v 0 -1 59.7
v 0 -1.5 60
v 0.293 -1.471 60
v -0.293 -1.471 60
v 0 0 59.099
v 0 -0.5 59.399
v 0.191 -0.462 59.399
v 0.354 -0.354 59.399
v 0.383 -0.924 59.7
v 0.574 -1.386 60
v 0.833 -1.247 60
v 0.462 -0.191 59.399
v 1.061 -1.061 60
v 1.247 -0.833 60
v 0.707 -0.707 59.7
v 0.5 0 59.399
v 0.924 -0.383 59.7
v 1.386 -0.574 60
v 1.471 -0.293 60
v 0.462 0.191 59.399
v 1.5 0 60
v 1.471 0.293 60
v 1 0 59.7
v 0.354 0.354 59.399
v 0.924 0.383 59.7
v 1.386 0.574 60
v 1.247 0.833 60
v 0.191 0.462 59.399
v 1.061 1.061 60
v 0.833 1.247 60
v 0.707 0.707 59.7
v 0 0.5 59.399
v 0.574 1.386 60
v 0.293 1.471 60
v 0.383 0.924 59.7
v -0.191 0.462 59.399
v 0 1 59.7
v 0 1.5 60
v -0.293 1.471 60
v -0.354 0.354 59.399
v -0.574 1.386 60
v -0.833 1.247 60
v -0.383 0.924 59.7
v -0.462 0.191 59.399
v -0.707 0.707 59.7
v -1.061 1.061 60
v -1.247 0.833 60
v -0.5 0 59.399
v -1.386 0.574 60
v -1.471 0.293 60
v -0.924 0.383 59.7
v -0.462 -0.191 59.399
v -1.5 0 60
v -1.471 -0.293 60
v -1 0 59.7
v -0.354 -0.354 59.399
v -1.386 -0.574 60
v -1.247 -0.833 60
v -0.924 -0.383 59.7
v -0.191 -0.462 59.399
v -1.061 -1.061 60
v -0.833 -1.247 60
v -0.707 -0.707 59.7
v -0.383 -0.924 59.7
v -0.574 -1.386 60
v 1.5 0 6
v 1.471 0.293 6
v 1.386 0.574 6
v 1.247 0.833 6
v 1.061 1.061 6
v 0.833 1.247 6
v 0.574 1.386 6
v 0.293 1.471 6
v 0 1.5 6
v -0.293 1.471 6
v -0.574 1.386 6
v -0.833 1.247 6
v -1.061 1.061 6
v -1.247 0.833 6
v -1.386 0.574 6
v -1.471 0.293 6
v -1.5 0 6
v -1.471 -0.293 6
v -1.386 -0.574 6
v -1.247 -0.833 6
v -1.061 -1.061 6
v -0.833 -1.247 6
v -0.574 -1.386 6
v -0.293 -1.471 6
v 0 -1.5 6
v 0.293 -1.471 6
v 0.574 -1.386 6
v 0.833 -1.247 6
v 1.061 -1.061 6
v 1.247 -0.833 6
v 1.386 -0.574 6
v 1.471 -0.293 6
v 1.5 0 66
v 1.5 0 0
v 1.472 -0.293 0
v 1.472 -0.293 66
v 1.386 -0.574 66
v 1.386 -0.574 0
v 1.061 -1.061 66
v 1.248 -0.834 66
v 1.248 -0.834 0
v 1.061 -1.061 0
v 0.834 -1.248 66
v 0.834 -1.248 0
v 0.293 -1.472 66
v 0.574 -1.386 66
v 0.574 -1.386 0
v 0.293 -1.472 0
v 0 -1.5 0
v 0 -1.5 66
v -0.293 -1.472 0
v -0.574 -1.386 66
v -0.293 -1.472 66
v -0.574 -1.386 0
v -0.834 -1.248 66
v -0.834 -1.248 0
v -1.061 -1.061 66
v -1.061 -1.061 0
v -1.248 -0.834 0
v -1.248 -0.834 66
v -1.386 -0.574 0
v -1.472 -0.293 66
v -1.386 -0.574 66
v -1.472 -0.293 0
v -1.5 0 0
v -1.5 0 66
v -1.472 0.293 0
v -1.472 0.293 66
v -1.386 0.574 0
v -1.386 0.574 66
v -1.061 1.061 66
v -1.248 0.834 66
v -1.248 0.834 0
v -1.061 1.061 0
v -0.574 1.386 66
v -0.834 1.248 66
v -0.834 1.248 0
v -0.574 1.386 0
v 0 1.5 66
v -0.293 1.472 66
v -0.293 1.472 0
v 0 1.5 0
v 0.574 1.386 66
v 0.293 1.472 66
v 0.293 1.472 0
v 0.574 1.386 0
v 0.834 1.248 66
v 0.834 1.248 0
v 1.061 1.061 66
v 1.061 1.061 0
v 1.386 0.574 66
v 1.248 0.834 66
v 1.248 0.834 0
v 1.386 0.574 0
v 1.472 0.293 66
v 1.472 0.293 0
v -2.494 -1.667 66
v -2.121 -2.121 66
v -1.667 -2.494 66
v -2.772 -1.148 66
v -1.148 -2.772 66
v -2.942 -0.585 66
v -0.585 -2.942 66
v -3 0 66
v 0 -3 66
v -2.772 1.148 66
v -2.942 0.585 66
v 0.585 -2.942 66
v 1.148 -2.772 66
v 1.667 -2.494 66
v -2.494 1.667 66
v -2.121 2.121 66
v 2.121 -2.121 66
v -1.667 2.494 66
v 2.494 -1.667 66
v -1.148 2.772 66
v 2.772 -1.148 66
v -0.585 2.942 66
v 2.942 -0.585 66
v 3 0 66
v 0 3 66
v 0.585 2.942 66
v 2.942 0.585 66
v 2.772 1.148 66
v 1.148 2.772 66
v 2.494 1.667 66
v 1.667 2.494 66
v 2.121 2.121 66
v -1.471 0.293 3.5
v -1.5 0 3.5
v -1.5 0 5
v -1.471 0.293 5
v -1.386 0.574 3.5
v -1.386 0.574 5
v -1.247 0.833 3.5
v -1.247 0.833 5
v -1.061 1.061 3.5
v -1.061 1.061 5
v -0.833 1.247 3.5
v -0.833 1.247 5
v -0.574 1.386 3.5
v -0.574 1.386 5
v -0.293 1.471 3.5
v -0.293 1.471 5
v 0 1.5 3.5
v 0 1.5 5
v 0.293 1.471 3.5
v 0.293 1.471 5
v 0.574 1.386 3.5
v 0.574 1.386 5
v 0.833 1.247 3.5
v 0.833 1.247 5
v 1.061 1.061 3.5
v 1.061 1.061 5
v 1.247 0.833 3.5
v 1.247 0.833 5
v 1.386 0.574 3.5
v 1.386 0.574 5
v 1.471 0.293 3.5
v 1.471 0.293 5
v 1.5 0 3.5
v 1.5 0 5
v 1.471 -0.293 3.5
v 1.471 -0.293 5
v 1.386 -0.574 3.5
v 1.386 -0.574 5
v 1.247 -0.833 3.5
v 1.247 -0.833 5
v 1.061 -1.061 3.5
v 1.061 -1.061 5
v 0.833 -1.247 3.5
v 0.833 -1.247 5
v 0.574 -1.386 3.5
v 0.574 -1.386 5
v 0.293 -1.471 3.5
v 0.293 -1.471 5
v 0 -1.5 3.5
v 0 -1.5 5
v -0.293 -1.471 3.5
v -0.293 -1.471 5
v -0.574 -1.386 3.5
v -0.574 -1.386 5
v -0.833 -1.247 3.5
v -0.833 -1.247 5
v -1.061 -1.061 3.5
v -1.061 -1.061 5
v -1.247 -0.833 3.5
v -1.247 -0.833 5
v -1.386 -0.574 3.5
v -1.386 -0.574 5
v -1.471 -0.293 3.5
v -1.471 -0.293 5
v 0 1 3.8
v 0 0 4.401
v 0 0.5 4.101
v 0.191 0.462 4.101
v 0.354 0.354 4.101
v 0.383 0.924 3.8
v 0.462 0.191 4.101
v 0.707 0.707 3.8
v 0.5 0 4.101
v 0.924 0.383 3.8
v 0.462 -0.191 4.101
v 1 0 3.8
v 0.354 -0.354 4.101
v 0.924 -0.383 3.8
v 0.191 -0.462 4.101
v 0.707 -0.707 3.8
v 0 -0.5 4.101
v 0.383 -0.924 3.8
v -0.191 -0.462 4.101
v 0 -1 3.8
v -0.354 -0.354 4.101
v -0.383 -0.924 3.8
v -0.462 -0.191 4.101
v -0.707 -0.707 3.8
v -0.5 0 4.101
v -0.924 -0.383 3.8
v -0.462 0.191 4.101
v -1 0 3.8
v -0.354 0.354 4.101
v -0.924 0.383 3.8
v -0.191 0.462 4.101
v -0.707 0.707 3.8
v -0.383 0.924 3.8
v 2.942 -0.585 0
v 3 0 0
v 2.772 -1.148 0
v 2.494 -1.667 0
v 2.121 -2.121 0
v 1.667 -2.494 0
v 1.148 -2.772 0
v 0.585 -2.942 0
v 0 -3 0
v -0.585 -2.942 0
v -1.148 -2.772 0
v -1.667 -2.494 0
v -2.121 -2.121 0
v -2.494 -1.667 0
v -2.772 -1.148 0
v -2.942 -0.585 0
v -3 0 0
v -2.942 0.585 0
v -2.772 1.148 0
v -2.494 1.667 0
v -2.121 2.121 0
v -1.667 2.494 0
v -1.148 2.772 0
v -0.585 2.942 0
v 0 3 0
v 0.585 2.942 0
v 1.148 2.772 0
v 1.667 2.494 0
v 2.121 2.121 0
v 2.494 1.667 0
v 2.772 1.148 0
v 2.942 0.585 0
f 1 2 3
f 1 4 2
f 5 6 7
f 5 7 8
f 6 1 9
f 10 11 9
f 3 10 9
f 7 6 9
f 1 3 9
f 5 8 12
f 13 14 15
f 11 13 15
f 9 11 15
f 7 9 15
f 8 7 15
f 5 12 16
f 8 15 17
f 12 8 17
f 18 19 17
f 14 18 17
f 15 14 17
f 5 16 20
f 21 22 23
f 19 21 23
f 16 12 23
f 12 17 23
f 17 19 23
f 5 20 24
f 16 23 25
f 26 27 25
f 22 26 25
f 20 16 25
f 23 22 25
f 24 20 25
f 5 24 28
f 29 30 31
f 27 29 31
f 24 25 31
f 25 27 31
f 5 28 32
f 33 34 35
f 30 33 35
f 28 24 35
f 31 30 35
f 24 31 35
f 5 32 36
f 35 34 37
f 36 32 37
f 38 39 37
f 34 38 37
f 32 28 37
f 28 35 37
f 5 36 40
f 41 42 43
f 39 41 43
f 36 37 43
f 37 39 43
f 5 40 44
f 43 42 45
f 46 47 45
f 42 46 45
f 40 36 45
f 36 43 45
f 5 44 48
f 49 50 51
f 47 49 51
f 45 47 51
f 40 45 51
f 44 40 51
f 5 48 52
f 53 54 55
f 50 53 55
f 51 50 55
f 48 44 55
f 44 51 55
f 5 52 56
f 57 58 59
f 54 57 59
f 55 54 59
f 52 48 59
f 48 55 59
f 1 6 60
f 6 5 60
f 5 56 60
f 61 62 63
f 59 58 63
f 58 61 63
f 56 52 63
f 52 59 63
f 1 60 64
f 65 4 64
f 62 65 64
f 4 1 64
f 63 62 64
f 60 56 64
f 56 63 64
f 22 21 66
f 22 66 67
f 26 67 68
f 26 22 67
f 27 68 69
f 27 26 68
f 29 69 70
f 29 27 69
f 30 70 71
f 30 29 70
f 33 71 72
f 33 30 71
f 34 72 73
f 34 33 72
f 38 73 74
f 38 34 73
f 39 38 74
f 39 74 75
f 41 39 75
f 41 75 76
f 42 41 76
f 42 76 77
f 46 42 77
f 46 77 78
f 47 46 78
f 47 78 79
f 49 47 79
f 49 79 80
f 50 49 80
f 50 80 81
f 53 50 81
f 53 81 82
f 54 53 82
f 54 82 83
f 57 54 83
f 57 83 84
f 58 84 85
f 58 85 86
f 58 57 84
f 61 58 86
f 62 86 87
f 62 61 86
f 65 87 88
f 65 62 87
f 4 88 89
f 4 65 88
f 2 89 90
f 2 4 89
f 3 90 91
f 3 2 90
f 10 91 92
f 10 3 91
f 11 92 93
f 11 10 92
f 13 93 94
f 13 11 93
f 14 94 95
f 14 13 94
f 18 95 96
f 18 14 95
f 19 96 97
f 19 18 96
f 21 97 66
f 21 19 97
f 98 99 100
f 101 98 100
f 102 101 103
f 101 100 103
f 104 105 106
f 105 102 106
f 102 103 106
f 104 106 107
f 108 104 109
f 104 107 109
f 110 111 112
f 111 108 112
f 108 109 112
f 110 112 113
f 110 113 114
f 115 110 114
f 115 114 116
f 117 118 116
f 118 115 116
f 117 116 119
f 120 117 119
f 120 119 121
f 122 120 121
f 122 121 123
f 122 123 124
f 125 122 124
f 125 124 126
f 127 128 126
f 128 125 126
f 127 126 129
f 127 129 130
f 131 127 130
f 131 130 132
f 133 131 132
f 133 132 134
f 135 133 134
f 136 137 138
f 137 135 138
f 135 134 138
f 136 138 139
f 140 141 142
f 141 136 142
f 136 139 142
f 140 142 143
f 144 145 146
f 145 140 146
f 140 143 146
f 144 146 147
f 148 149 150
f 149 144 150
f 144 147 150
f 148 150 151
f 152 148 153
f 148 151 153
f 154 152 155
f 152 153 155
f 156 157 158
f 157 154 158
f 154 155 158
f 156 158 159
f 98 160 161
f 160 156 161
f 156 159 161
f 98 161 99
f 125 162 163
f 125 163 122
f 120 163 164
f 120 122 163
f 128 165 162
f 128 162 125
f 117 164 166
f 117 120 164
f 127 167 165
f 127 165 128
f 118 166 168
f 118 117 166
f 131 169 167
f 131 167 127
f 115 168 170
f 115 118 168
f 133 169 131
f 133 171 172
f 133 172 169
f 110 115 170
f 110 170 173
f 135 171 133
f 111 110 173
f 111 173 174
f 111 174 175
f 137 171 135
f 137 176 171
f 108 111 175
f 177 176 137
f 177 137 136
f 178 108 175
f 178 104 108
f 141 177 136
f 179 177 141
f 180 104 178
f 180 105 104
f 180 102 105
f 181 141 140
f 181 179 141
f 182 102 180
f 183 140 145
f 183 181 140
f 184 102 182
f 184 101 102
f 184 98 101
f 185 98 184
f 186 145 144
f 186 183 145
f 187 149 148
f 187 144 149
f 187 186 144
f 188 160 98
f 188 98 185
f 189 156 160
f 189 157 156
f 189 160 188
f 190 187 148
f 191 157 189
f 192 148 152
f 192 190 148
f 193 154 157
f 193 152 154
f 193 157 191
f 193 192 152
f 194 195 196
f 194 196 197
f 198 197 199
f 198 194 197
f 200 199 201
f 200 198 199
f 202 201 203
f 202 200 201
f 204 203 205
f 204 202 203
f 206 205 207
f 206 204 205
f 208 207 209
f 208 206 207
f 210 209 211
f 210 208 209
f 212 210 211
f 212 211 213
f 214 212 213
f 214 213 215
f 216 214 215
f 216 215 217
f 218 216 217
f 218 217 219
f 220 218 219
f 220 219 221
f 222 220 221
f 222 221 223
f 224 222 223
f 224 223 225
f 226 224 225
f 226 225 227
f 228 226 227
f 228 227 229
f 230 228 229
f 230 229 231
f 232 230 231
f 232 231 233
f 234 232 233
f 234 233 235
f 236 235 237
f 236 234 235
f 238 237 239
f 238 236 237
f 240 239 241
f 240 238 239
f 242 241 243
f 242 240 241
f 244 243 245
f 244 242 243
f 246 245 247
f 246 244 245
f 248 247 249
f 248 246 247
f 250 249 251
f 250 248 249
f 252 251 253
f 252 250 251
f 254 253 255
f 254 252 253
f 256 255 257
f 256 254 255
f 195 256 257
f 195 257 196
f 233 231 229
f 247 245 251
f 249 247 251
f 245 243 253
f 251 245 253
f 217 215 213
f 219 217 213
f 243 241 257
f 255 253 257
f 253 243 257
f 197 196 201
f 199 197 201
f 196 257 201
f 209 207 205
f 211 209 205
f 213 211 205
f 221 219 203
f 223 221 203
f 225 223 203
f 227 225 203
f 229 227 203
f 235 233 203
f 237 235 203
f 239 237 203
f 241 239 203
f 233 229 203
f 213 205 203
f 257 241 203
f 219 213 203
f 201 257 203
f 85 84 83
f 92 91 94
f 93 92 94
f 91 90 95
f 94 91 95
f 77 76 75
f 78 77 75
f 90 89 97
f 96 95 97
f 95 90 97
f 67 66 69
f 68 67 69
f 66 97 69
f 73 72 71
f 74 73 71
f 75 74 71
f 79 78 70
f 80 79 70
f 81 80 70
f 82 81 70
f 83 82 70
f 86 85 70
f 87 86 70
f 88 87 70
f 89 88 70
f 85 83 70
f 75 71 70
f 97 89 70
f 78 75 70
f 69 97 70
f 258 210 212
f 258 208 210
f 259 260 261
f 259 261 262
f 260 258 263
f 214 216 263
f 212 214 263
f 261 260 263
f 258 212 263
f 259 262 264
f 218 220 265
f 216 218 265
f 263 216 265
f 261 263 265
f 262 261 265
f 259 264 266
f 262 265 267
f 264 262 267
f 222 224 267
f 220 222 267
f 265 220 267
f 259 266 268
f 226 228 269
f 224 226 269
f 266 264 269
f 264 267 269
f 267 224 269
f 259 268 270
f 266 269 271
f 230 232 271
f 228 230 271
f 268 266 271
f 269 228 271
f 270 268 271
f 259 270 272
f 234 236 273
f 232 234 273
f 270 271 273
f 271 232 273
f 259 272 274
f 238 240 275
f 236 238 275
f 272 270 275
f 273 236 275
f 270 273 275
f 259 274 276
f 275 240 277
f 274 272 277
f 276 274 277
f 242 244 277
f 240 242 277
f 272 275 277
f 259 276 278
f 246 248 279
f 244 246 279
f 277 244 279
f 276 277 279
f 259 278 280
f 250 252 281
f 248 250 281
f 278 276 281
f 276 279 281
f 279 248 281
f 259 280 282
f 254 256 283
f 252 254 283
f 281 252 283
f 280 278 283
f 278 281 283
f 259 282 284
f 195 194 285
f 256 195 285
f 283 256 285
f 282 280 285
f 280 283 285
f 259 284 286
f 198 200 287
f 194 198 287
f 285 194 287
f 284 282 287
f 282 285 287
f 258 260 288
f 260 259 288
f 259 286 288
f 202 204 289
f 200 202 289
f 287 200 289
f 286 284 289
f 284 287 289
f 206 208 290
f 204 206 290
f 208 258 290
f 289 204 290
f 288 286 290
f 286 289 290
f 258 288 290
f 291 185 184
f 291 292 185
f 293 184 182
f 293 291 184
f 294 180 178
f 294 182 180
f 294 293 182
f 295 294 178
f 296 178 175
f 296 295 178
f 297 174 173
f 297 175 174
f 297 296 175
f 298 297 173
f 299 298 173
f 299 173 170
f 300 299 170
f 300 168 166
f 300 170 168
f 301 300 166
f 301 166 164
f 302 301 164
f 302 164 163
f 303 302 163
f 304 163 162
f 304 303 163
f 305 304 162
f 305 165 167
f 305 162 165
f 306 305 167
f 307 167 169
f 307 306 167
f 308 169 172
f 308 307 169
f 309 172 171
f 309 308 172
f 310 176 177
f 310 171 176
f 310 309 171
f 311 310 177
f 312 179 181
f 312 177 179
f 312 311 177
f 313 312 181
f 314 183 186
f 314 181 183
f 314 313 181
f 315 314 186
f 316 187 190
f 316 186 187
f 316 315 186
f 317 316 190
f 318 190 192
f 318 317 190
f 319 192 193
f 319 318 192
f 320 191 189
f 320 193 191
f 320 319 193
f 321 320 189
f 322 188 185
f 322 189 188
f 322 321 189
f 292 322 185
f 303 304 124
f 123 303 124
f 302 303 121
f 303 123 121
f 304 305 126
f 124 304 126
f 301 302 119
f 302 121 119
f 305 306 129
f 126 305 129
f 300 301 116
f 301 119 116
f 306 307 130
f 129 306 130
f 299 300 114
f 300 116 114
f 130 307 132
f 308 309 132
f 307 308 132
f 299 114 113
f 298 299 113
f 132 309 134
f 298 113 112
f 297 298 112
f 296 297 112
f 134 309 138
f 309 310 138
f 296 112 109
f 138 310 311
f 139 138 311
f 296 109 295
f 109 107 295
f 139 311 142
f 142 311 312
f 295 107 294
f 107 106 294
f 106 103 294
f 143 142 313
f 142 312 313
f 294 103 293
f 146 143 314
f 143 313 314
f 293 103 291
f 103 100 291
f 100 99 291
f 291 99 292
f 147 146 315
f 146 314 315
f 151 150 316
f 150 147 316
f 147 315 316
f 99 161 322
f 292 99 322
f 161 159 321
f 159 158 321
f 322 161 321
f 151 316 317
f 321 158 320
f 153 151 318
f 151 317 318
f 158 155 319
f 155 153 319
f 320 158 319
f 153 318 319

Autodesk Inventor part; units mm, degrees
ref_plane "YZ Plane" through (0, 0, 0) normal (1, 0, 0) x (0, 1, 0)
ref_plane "XZ Plane" through (0, 0, 0) normal (0, 1, 0) x (-1, 0, 0)
ref_plane "XY Plane" through (0, 0, 0) normal (0, 0, 1) x (1, 0, 0)
sketch "スケッチ1" plane through (0, 0, 0) normal (0, 0, 1) x (1, 0, 0)
  circle A0 centre (0, 0) radius 3
  circle A1 centre (0, 0) radius 1.5005
  dimension "d0" = 6
  dimension "d1" = 3.001
extrude "押し出し1" add sketch "スケッチ1" along normal blind 66
sketch "スケッチ2" plane through (0, 0, 66) normal (0, 0, 1) x (1, 0, 0)
  circle A0 centre (0, 0) radius 1.5
  dimension "d4" = 3
extrude "押し出し2" add sketch "スケッチ2" against normal blind 60
hole "穴1" at (0, 0, 66) direction (0, 0, -1) diameter 3 depth 6 tip angle 118
sketch "スケッチ3" plane through (0, 0, 0) normal (0, 0, -1) x (-1, 0, 0)
  circle A0 centre (0, 0) radius 1.5 projected
  circle A1 centre (0, 0) radius 1.5
  dimension "d14" = 3
extrude "押し出し3" add sketch "スケッチ3" against normal blind 5
hole "穴2" at (0, 0, 0) direction (0, 0, 1) diameter 3 depth 3.5 tip angle 118
properties part number "スペーサーm3-65　簡易筒型" material "アルミニウム 2014-T4"
